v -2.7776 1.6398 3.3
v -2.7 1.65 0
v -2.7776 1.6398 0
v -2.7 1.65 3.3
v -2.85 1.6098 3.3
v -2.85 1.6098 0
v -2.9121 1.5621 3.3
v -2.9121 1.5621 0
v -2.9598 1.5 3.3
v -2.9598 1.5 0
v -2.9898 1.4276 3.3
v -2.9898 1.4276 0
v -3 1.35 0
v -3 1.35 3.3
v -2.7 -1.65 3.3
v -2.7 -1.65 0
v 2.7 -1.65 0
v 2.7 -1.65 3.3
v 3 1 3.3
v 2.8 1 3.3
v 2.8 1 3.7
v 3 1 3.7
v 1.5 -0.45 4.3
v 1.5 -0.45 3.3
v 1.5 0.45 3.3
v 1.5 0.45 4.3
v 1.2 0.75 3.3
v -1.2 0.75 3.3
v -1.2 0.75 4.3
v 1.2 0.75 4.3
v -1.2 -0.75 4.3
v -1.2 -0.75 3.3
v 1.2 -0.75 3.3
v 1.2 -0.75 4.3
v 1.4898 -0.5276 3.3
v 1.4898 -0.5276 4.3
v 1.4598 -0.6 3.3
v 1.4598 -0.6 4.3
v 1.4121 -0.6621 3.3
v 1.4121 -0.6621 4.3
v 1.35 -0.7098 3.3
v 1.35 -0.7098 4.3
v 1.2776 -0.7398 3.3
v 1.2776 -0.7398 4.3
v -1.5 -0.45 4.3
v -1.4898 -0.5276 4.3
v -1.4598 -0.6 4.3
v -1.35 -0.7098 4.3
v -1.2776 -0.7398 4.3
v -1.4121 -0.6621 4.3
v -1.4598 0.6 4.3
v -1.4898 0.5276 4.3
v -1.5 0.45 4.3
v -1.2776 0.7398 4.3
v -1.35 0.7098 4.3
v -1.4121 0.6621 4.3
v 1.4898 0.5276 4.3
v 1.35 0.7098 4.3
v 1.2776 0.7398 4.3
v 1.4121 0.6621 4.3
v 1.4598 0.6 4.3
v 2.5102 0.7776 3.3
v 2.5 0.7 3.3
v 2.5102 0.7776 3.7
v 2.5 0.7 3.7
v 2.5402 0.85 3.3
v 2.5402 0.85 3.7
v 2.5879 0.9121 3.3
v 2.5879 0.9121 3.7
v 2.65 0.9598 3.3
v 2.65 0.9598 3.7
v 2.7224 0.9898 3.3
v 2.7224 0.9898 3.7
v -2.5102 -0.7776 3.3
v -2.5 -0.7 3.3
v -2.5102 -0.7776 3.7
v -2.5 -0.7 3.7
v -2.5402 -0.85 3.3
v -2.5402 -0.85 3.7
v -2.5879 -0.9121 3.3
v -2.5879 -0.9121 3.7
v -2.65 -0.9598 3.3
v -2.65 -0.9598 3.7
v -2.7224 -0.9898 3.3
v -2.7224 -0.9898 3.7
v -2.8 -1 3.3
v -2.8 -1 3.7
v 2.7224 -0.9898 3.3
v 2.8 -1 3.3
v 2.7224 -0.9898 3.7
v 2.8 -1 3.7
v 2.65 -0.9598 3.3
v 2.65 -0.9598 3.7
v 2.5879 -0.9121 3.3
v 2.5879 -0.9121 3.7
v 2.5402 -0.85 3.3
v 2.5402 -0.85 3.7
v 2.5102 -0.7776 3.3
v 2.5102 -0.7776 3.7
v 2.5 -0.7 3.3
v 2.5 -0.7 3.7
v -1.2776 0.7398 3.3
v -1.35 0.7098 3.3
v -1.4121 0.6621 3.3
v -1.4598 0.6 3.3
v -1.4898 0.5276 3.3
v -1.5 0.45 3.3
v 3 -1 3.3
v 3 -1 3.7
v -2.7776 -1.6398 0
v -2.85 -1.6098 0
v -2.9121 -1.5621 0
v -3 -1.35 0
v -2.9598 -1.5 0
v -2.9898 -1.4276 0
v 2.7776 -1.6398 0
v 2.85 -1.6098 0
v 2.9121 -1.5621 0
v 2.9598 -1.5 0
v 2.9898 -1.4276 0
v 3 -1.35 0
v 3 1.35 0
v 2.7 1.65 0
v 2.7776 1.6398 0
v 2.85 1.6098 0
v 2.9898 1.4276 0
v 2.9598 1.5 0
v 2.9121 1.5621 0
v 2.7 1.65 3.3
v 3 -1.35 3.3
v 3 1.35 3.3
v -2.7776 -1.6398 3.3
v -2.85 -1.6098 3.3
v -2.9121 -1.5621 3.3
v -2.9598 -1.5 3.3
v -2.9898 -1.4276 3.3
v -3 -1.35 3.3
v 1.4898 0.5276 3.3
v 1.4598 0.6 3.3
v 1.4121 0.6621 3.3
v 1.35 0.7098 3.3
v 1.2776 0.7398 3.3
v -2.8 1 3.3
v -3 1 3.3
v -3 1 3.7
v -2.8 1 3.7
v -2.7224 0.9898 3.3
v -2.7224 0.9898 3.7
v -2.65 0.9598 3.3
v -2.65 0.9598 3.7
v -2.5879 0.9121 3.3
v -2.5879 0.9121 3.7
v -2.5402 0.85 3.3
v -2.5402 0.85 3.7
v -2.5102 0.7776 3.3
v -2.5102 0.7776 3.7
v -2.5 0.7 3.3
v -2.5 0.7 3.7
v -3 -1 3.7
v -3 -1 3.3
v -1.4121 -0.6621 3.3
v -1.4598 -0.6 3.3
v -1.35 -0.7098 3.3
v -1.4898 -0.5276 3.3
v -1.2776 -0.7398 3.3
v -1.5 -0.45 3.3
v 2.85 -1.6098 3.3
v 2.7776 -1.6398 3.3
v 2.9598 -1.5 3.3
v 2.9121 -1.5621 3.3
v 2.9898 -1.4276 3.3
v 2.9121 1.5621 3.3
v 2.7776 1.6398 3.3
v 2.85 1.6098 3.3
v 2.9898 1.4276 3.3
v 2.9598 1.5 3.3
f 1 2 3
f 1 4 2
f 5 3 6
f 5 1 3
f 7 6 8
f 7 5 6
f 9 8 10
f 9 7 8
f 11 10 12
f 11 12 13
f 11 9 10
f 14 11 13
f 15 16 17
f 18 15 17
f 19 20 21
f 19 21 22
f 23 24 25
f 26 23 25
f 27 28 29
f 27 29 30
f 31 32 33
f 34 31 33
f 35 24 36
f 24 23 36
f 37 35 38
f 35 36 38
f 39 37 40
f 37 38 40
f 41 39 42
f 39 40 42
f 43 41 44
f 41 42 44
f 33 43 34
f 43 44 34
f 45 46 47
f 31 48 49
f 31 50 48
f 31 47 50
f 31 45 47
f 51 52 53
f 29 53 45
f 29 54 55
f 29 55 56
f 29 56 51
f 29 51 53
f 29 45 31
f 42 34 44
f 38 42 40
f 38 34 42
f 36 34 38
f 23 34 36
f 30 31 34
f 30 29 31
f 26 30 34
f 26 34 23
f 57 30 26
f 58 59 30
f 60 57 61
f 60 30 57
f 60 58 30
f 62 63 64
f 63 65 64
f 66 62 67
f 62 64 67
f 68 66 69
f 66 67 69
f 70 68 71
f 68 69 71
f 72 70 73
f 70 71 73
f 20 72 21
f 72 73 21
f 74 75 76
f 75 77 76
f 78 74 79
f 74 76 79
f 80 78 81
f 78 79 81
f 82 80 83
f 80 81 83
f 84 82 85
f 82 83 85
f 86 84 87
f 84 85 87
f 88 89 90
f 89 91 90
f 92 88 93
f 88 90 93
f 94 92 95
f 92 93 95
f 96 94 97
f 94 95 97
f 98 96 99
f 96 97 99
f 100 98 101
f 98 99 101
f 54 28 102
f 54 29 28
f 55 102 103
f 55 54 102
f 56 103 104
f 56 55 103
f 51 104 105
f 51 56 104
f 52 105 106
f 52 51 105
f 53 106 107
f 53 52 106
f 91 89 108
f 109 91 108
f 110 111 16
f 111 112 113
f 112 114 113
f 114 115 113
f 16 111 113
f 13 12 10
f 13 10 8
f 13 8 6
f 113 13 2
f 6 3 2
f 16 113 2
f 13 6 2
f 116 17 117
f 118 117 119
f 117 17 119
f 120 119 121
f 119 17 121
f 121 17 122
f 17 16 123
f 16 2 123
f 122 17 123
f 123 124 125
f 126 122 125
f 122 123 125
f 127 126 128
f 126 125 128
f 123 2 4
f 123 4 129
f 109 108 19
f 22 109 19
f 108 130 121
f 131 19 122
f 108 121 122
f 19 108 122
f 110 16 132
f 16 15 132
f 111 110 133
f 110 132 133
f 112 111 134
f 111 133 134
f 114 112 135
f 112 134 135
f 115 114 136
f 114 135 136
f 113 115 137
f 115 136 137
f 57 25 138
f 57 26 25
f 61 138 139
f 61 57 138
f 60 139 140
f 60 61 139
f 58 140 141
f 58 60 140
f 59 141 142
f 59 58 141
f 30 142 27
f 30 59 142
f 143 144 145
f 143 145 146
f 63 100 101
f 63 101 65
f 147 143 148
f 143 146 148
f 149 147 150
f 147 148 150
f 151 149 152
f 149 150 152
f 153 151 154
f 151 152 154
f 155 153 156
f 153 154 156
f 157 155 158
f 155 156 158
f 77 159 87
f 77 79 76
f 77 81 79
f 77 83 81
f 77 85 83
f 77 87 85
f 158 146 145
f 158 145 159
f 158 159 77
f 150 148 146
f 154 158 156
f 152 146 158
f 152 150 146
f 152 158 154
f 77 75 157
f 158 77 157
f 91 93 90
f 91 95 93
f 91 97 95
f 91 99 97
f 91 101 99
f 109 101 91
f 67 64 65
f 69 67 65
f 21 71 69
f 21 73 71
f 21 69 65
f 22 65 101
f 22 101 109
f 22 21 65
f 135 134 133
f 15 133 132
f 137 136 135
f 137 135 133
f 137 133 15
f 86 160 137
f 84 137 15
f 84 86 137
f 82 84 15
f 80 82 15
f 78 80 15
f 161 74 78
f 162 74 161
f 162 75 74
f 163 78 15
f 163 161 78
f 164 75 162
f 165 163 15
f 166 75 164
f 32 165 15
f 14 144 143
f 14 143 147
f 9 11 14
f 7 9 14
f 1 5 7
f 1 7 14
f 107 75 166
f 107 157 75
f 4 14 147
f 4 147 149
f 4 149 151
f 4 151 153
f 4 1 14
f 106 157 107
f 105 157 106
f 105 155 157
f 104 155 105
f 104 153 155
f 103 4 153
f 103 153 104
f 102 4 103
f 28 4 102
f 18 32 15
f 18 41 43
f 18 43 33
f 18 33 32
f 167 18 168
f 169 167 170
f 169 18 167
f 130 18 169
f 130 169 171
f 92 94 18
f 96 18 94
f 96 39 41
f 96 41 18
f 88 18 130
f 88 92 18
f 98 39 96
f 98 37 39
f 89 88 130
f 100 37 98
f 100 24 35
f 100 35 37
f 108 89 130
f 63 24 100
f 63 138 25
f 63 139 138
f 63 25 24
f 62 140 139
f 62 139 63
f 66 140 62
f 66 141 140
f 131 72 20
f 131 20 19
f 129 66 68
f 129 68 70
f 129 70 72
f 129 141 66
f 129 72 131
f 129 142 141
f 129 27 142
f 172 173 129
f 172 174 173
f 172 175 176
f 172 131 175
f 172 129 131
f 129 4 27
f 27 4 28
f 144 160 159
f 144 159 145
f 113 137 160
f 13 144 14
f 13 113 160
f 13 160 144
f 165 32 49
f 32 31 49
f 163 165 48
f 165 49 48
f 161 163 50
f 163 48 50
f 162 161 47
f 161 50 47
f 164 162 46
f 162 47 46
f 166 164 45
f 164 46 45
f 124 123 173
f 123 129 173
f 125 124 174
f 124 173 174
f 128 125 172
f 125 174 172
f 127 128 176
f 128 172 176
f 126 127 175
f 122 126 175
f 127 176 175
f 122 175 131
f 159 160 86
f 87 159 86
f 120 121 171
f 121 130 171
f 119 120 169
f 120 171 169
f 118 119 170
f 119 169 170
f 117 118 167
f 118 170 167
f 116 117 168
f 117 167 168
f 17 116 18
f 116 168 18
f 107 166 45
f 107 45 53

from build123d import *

# Parameters (mm, degrees)
SKETCH_W     = 6
SKETCH_H     = 3.3
PAD_DEPTH    = 3.3
SKETCH001_W  = 3
SKETCH001_H  = 1.5
PAD001_DEPTH = 4.3
SKETCH002_W  = 0.5
SKETCH002_H  = 2
PAD002_DEPTH = 3.7
FILLET_R     = 0.3


with BuildPart() as part:
    # Sketch → Pad (new body)
    with BuildSketch(Plane.XY):
        Rectangle(SKETCH_W, SKETCH_H)
    extrude(amount=PAD_DEPTH)

    # Sketch001 → Pad001 (join)
    with BuildSketch(Plane.XY):
        Rectangle(SKETCH001_W, SKETCH001_H)
    extrude(amount=PAD001_DEPTH)

    # Sketch002 → Pad002 (join)
    with BuildSketch(Plane.XY):
        with Locations((-2.75, 0)):
            Rectangle(SKETCH002_W, SKETCH002_H)
        with Locations((2.75, 0)):
            Rectangle(SKETCH002_W, SKETCH002_H)
    extrude(amount=PAD002_DEPTH)

    # Fillet
    fillet_edges = [part.edges().sort_by_distance(p)[0] for p in [
        (3, -1.65, 1.65),
        (-3, -1.65, 1.65),
        (3, 1.65, 1.65),
        (1.5, -0.75, 3.8),
        (1.5, 0.75, 3.8),
        (2.5, -1, 3.5),
        (-2.5, -1, 3.5),
        (-2.5, 1, 3.5),
        (-1.5, -0.75, 3.8),
        (2.5, 1, 3.5),
        (-1.5, 0.75, 3.8),
        (-3, 1.65, 1.65),
    ]]
    fillet(fillet_edges, radius=FILLET_R)


solid = part.part
